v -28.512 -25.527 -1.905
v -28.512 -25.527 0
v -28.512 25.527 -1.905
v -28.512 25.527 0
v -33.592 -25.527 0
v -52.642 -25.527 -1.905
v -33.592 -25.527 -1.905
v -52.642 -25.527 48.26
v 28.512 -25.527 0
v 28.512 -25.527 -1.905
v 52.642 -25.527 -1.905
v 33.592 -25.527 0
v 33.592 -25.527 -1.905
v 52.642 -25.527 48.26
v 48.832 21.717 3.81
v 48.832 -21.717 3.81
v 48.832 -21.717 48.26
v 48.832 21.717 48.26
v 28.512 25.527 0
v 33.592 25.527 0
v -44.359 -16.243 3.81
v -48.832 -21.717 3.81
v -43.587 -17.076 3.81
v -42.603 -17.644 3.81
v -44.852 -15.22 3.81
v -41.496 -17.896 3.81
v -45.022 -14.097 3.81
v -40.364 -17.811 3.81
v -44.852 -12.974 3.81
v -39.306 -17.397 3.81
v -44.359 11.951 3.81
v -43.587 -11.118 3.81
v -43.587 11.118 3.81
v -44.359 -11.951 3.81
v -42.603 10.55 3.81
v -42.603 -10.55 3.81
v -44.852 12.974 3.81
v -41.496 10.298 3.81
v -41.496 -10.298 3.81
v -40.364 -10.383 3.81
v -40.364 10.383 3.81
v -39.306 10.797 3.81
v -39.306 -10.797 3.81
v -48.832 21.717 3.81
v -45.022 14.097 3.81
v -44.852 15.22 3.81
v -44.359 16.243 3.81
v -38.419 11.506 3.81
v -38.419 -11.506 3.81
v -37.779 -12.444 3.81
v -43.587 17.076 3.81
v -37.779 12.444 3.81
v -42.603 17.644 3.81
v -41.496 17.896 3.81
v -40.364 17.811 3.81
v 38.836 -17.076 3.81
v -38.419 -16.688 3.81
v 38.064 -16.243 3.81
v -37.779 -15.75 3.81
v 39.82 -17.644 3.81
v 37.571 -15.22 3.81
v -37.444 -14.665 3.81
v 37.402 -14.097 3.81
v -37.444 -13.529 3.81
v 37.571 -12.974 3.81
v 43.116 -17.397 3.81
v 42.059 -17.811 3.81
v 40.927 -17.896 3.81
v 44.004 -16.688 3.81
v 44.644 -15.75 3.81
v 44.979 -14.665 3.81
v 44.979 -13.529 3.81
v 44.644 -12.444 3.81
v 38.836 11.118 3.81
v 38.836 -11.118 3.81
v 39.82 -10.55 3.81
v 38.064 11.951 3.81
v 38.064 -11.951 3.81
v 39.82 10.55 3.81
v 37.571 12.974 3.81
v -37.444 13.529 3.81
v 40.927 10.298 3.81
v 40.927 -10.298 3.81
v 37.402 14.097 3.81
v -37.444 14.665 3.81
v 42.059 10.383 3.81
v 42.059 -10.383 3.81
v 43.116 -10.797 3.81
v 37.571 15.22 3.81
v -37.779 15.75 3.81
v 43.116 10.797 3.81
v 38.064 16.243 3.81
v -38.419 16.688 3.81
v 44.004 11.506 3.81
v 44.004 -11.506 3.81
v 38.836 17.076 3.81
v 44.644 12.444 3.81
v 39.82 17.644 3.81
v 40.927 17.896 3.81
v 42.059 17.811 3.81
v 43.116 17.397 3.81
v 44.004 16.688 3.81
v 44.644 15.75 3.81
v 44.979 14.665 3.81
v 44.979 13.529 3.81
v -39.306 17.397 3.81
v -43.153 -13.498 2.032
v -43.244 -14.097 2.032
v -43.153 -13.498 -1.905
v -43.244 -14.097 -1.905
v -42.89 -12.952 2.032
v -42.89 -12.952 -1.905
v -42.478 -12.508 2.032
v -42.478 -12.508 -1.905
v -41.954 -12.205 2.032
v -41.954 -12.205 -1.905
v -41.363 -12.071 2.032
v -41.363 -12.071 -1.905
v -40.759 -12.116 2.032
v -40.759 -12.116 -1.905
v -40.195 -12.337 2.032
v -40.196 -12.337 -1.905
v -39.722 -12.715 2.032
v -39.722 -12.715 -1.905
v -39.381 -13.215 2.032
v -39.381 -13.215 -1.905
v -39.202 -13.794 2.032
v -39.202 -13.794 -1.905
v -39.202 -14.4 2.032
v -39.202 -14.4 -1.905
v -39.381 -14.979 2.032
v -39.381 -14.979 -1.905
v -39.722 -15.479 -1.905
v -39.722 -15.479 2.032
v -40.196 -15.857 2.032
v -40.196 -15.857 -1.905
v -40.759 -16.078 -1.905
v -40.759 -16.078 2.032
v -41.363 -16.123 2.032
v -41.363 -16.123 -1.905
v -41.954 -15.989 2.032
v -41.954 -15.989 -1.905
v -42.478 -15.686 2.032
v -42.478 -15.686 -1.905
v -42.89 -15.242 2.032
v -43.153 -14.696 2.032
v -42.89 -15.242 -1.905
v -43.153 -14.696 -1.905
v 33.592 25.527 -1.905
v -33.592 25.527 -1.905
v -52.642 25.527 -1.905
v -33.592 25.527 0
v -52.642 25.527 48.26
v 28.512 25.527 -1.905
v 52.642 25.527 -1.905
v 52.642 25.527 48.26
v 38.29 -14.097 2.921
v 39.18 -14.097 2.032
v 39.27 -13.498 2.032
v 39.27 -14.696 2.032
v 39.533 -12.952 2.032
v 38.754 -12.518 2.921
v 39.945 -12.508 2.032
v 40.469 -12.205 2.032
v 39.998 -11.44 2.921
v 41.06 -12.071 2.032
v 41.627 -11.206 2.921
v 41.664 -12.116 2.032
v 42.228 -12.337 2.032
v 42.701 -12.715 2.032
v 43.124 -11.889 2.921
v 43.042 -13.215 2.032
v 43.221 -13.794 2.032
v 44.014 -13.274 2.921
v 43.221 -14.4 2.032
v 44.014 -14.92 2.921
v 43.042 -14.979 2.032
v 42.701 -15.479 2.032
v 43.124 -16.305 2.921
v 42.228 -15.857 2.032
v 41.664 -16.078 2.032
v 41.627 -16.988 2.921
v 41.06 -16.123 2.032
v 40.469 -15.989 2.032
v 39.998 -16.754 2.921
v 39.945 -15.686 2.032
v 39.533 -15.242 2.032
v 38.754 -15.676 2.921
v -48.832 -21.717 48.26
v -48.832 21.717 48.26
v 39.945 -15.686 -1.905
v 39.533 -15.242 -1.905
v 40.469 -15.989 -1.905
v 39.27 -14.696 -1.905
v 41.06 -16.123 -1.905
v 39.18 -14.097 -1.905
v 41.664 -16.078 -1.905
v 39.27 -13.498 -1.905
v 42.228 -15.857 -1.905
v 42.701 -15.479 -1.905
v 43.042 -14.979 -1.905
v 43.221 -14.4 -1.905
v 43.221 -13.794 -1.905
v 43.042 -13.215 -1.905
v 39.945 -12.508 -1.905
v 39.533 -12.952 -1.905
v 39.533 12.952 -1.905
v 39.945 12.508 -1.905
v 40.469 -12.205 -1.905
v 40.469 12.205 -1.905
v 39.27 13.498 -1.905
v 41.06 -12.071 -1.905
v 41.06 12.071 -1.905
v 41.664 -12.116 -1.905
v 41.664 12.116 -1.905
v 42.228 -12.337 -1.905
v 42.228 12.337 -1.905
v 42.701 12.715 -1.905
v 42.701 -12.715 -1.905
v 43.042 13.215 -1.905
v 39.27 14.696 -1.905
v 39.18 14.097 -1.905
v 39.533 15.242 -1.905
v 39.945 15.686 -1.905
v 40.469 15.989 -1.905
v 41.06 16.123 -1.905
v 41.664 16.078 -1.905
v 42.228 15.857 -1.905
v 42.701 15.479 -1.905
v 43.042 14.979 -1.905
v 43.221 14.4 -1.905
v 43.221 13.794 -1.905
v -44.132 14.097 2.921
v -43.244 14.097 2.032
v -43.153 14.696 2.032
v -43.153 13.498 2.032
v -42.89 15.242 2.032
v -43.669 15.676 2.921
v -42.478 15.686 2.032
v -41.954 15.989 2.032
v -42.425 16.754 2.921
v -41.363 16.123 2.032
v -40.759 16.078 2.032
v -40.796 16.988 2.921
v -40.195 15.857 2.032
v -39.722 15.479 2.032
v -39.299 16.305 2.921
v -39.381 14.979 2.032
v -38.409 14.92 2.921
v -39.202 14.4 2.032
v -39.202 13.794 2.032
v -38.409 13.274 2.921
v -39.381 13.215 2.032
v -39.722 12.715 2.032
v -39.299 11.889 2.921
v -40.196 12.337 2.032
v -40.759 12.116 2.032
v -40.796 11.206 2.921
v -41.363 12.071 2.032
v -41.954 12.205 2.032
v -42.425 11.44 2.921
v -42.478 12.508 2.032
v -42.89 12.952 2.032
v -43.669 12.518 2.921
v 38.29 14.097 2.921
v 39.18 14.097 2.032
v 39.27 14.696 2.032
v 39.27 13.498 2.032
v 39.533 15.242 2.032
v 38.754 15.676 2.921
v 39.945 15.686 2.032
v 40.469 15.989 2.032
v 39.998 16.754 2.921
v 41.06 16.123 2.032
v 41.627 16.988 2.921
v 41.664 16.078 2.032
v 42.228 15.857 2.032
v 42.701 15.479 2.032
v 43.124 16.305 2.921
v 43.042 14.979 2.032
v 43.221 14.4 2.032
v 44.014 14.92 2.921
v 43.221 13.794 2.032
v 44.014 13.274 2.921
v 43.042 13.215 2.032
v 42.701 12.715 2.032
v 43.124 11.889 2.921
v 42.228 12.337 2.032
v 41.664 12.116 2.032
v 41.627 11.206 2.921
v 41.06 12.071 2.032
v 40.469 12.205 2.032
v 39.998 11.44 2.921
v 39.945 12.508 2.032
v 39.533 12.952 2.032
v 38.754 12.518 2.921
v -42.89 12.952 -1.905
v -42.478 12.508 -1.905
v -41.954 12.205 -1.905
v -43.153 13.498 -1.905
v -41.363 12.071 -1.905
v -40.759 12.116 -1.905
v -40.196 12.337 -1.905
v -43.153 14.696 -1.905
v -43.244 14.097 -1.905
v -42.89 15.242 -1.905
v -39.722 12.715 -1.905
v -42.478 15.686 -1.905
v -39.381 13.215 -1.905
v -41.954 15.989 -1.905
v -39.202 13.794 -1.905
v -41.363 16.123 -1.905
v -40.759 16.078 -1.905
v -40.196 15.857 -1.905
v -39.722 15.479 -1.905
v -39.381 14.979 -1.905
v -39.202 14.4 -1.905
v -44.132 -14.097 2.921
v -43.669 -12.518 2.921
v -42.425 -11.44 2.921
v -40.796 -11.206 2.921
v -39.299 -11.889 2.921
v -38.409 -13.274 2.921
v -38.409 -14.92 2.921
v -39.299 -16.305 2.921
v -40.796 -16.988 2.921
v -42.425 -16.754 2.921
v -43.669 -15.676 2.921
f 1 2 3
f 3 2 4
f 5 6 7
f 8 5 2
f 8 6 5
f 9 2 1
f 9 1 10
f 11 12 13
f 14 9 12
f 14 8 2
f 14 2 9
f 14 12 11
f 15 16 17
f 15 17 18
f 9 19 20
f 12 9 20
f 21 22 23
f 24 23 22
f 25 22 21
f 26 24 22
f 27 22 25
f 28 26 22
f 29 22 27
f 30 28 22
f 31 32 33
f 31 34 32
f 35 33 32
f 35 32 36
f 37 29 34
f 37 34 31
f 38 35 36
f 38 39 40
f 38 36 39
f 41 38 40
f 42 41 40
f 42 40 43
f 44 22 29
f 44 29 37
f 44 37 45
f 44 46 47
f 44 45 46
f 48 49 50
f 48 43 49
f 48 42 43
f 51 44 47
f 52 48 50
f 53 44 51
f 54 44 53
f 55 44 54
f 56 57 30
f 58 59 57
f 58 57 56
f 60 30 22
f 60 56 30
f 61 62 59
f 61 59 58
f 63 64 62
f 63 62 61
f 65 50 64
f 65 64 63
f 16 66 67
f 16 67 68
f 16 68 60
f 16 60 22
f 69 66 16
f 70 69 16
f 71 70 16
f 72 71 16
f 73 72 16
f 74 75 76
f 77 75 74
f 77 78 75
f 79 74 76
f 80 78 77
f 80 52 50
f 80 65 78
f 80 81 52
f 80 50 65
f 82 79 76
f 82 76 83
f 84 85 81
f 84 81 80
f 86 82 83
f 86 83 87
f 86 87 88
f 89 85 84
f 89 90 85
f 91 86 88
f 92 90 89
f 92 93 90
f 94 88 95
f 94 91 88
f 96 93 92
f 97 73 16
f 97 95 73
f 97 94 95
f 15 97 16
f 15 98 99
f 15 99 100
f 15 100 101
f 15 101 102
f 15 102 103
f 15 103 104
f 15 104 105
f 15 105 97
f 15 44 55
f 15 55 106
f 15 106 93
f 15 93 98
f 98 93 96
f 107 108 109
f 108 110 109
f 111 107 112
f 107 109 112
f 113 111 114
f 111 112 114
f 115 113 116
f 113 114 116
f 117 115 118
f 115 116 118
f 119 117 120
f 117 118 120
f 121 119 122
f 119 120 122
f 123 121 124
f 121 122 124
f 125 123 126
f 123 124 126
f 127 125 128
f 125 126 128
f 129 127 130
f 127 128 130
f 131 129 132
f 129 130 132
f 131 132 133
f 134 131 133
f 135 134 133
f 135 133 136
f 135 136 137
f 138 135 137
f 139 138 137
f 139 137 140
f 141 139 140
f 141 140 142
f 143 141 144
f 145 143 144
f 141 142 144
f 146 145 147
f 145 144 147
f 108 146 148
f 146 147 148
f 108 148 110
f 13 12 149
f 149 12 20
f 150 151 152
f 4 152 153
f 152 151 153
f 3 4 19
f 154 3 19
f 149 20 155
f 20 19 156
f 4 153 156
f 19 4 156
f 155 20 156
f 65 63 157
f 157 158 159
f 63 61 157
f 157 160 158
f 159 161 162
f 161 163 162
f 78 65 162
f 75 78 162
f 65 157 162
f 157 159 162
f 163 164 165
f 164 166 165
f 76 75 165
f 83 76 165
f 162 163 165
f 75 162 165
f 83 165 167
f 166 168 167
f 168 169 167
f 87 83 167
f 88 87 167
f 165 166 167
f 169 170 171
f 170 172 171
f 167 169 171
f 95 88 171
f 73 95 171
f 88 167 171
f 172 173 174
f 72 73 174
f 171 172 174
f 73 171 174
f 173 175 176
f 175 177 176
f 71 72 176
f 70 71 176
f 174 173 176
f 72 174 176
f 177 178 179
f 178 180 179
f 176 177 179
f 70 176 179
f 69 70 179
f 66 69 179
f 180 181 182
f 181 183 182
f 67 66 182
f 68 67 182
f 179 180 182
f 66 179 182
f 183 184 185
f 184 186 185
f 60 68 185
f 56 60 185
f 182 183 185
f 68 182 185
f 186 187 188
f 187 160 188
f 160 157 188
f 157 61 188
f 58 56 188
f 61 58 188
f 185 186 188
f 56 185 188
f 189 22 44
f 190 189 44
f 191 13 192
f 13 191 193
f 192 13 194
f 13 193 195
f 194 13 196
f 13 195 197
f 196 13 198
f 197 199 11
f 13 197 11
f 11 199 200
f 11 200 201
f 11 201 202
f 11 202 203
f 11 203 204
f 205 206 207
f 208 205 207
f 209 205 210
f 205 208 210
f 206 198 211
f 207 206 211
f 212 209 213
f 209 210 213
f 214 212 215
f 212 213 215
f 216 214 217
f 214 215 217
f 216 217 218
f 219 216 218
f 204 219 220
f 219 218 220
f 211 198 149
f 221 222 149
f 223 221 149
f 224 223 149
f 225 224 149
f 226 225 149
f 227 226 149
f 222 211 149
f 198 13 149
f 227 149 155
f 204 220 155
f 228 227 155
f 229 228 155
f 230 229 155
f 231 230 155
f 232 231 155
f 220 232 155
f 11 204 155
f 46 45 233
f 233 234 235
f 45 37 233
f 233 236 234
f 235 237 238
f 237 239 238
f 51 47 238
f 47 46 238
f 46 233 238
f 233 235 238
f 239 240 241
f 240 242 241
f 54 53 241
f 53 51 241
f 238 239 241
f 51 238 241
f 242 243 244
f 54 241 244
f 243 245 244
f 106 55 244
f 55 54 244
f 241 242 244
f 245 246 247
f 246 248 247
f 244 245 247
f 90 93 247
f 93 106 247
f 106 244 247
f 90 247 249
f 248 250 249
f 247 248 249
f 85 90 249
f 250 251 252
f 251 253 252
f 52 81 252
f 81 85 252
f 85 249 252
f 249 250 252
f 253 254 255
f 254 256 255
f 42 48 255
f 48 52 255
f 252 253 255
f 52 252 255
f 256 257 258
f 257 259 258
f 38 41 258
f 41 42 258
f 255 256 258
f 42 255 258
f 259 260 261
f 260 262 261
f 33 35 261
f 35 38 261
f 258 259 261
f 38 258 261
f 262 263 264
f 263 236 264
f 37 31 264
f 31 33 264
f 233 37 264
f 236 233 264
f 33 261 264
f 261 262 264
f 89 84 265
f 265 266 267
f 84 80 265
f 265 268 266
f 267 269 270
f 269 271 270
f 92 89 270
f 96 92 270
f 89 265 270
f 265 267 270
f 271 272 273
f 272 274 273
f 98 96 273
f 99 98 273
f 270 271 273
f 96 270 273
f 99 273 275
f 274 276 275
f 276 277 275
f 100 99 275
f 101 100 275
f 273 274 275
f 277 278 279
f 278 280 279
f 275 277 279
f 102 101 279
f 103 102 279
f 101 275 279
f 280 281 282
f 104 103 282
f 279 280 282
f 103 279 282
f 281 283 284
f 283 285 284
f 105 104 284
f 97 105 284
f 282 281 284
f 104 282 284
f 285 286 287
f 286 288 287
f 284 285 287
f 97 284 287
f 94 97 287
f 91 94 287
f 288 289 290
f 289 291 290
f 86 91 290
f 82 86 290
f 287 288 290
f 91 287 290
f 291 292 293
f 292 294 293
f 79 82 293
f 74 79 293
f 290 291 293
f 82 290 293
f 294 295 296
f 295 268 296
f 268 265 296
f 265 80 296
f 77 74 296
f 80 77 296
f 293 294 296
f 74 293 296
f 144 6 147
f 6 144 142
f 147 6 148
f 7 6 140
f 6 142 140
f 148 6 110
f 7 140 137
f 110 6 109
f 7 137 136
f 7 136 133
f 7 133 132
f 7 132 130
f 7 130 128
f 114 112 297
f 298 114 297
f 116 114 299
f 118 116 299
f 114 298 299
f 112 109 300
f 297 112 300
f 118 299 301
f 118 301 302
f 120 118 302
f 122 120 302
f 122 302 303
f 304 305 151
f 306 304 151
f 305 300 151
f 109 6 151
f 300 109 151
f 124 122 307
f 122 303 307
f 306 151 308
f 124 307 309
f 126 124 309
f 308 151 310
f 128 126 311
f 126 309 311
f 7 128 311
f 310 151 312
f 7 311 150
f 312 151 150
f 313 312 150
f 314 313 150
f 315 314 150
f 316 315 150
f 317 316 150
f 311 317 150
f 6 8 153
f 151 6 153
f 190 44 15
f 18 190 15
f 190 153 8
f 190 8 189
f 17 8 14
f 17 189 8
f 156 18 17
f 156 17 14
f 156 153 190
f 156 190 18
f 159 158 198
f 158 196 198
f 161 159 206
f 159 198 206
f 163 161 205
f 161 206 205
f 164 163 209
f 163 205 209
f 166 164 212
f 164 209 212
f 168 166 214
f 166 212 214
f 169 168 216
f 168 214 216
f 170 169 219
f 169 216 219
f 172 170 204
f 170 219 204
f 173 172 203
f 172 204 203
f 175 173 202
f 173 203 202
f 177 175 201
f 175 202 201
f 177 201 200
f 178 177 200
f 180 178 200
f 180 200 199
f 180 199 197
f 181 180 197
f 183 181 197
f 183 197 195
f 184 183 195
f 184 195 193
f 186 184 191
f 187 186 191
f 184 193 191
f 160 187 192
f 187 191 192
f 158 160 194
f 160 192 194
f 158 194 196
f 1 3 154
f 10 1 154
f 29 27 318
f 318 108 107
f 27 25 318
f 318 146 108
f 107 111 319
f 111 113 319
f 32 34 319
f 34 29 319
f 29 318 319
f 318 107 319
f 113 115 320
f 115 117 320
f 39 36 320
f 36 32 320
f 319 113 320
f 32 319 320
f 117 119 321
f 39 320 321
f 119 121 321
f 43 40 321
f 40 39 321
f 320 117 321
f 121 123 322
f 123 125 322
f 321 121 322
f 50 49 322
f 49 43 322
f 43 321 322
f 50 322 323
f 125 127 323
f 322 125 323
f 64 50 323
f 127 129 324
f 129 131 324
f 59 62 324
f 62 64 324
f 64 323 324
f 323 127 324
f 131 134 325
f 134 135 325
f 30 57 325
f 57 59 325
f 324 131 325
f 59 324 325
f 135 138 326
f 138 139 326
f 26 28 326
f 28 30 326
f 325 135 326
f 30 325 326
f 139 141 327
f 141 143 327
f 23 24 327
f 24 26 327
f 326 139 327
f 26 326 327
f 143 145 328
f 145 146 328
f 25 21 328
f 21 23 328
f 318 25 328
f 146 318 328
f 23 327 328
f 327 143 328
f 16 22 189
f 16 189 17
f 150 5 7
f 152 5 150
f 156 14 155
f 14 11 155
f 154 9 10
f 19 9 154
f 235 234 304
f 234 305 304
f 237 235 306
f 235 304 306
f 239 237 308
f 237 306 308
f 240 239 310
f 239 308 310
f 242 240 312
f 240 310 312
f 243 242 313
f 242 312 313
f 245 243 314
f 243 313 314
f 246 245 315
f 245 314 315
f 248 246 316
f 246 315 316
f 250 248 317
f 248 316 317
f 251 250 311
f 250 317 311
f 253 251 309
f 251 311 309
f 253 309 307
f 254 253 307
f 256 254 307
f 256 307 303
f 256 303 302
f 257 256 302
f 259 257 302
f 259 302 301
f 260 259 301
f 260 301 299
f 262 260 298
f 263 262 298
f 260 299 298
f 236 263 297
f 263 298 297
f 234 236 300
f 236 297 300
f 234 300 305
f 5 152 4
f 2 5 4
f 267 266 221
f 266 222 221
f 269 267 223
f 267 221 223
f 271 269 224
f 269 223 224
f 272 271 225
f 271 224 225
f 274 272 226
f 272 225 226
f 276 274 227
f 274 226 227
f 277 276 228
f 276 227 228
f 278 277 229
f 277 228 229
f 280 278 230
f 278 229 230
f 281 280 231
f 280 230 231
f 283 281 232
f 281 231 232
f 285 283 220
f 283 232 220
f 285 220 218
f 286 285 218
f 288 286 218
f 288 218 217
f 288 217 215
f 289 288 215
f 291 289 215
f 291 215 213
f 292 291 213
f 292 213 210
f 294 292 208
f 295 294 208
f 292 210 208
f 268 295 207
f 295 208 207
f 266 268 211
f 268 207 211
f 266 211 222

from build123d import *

# Parameters (mm, degrees)
SKETCH001_W      = 97.663
SKETCH001_H      = 43.434
PAD_DEPTH        = 3.81
SKETCH_W         = 105.283
SKETCH_H         = 51.054
SKETCH_W_2       = 97.663
SKETCH_H_2       = 43.434
PAD001_DEPTH     = 48.26
SKETCH003_W      = 19.05
SKETCH003_H      = 51.054
SKETCH003_W_2    = 57.023
PAD002_DEPTH     = 1.905
HOLE_D           = 4.064
HOLE_DEPTH       = 24.9936
HOLE_CSINK_D     = 7.62
HOLE_CSINK_ANGLE = 90


with BuildPart() as part:
    # Sketch001 → Pad (new body)
    with BuildSketch(Plane.XY):
        Rectangle(SKETCH001_W, SKETCH001_H)
    extrude(amount=PAD_DEPTH)

    # Sketch → Pad001 (join)
    with BuildSketch(Plane.XY):
        Rectangle(SKETCH_W, SKETCH_H)
        Rectangle(SKETCH_W_2, SKETCH_H_2, mode=Mode.SUBTRACT)
    extrude(amount=PAD001_DEPTH)

    # Sketch003 → Pad002 (join)
    with BuildSketch(Plane.XY):
        with Locations((-43.1165, 0)):
            Rectangle(SKETCH003_W, SKETCH003_H)
        with Locations((43.1165, 0)):
            Rectangle(SKETCH003_W, SKETCH003_H)
        Rectangle(SKETCH003_W_2, SKETCH003_H)
    extrude(amount=-PAD002_DEPTH)

    # Hole
    with Locations(Plane.XY.offset(3.81)):
        with Locations((41.2115, 14.097), (41.2115, -14.097), (-41.2115, -14.097), (-41.2115, 14.097)):
            CounterSinkHole(HOLE_D / 2, HOLE_CSINK_D / 2, depth=HOLE_DEPTH, counter_sink_angle=HOLE_CSINK_ANGLE)


solid = part.part
